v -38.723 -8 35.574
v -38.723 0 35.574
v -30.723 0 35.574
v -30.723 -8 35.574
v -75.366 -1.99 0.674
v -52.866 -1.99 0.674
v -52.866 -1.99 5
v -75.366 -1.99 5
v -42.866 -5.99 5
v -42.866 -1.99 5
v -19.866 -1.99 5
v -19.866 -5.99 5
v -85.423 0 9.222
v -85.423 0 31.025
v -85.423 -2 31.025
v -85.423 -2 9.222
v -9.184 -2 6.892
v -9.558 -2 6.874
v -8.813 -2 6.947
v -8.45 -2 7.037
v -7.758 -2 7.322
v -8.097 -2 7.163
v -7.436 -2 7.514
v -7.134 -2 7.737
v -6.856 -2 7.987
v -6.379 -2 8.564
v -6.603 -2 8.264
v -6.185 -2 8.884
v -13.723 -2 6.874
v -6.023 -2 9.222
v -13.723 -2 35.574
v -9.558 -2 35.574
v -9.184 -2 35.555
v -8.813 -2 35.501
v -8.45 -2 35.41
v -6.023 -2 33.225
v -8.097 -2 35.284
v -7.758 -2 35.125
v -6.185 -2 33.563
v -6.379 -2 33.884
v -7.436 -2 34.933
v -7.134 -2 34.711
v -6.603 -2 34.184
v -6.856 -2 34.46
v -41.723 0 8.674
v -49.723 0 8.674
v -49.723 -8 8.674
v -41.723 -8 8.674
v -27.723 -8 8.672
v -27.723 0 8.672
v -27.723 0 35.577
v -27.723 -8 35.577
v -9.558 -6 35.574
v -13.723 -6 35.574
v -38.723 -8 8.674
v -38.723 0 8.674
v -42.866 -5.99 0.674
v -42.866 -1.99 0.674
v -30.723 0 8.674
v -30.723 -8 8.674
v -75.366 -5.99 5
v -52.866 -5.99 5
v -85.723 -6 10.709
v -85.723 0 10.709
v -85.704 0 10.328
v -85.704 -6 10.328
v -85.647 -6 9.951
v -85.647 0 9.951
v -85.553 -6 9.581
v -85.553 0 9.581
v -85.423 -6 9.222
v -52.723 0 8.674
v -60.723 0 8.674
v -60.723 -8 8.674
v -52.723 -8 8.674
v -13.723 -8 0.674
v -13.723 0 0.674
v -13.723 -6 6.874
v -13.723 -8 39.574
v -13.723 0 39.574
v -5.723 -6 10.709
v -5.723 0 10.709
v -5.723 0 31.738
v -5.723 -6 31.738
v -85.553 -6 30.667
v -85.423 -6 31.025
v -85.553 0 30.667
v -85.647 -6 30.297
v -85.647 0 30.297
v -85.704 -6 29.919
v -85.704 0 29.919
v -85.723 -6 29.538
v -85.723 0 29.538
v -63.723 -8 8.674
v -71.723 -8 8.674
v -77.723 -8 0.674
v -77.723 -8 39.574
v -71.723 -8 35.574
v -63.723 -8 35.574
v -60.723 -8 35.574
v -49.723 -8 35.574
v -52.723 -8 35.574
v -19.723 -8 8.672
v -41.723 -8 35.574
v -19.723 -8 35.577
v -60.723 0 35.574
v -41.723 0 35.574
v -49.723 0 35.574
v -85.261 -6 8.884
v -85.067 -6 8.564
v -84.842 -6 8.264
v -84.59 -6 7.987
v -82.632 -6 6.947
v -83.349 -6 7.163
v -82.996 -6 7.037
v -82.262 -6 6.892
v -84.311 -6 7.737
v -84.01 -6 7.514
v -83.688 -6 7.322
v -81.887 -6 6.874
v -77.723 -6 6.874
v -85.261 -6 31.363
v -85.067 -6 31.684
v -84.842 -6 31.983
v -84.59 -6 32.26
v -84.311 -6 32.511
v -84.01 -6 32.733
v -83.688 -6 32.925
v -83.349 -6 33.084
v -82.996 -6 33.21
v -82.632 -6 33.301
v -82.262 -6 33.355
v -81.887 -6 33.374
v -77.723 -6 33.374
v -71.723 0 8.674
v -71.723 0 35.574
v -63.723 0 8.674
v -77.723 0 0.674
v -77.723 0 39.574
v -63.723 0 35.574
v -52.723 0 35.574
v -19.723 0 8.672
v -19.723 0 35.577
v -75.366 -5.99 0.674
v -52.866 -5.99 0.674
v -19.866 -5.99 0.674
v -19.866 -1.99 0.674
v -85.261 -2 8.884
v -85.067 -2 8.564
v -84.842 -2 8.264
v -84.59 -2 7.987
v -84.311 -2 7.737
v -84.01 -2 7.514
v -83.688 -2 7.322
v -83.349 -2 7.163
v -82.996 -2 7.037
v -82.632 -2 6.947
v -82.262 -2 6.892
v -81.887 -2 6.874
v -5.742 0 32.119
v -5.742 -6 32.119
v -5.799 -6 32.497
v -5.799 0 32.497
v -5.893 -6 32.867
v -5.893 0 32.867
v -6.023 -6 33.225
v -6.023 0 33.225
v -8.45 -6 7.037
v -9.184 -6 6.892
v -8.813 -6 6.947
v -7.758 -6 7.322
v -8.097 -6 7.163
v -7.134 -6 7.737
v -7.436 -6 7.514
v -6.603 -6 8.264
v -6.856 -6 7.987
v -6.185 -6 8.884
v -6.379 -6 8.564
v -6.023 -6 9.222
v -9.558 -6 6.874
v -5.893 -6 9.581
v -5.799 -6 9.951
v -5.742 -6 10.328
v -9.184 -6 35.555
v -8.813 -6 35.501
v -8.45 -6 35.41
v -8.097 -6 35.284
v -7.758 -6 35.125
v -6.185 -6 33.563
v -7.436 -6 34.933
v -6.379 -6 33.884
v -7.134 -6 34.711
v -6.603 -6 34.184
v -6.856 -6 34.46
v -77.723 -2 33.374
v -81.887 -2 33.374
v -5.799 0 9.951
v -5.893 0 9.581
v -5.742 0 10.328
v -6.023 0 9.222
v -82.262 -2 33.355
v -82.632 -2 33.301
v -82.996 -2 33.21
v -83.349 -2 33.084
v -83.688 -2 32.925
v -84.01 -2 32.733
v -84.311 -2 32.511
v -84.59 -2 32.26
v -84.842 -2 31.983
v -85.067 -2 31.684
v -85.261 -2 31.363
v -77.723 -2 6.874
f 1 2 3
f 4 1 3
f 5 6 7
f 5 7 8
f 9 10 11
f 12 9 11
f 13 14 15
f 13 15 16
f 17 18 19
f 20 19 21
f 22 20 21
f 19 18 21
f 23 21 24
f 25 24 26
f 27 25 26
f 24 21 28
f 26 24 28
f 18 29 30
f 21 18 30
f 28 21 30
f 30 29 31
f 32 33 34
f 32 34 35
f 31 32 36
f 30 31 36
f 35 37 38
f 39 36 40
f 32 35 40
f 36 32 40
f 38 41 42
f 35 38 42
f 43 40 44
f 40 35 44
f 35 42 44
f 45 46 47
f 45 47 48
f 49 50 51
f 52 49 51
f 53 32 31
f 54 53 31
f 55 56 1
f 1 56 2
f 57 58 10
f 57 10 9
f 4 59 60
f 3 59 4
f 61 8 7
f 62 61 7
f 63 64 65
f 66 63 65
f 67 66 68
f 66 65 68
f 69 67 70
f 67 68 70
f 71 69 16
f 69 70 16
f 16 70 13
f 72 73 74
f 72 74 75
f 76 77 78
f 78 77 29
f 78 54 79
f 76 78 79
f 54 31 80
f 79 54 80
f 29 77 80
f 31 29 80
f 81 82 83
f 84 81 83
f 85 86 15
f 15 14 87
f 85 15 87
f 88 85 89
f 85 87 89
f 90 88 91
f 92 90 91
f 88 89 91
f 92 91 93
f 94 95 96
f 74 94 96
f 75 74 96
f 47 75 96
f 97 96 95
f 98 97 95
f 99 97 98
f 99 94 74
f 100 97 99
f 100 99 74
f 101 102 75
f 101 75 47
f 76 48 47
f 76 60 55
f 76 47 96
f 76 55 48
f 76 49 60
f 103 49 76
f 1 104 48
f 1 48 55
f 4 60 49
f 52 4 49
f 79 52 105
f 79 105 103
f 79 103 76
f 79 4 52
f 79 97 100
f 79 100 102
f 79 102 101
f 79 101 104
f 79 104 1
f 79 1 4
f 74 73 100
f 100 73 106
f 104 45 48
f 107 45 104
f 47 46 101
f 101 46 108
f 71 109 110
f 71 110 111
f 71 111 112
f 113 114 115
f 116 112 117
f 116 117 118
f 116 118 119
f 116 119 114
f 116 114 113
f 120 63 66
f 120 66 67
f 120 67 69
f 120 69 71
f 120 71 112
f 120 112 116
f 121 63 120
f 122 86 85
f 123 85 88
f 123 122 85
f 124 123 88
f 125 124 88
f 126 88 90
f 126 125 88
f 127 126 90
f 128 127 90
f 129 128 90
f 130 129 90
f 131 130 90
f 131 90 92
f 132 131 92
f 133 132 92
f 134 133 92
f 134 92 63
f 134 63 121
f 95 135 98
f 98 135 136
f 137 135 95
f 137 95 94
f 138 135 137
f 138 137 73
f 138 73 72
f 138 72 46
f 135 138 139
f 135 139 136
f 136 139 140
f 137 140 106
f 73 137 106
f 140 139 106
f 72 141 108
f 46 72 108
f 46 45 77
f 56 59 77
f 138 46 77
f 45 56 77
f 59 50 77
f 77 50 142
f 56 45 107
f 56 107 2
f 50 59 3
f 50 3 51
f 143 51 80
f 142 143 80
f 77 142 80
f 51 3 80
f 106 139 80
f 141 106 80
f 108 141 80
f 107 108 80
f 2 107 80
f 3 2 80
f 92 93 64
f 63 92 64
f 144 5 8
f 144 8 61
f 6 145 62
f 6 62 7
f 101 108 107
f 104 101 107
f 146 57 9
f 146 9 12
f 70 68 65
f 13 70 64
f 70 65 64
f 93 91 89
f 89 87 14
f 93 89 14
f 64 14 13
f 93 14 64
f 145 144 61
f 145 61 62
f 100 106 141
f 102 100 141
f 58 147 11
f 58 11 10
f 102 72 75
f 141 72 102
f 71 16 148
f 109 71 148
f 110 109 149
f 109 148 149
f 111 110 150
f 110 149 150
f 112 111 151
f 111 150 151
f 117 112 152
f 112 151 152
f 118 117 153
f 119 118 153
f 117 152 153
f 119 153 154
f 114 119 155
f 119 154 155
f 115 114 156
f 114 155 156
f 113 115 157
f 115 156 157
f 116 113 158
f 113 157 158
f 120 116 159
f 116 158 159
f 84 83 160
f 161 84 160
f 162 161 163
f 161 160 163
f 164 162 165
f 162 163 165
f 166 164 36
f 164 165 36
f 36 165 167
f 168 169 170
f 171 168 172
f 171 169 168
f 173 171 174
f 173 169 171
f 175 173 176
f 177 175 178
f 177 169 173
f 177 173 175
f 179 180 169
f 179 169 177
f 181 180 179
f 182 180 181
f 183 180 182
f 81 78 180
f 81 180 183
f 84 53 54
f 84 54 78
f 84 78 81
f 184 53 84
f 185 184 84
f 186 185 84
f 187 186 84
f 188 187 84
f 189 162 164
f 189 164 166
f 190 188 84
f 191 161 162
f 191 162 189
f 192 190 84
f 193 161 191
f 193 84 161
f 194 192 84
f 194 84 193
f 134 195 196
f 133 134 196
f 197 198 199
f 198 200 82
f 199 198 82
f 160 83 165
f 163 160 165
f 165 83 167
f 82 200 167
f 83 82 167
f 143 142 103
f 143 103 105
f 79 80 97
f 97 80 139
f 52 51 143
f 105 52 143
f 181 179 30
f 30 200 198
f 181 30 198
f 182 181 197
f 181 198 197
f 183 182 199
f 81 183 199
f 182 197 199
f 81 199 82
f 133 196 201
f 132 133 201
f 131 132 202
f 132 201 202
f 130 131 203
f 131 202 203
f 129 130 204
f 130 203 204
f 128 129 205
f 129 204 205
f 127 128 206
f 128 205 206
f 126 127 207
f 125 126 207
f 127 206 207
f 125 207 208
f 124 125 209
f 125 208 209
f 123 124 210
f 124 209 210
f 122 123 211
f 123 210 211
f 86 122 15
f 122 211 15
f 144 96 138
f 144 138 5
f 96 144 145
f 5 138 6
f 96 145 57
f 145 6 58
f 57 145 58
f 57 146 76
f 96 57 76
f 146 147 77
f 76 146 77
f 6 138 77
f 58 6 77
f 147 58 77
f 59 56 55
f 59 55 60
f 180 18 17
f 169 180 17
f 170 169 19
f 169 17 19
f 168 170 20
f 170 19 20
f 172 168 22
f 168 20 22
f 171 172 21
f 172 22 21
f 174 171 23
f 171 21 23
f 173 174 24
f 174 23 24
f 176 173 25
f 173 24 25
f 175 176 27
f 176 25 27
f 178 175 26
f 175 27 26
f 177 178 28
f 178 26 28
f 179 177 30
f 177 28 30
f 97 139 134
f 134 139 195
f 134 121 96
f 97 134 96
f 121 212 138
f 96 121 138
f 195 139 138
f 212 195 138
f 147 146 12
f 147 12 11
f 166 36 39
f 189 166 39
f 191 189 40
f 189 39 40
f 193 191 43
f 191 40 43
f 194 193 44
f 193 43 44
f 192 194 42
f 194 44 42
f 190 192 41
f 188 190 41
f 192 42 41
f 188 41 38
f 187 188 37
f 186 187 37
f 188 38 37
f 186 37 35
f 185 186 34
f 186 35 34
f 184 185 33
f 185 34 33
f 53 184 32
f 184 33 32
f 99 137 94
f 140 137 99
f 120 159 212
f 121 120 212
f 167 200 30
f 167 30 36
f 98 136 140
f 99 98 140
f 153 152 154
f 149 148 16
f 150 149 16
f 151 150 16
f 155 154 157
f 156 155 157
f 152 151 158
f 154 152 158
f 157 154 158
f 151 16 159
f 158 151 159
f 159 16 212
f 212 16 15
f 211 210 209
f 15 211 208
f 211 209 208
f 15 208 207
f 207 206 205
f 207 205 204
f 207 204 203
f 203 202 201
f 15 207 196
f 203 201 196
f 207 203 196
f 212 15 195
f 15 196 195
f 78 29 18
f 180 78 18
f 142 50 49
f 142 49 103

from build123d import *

# Parameters (mm, degrees)
F0_W     = 8
F0_H     = 26.900017
F0_H_2   = 26.905365
F1_DEPTH = 6
F2_DEPTH = 2
F3_DEPTH = 8
F4_W     = 23
F4_H     = 4
F4_W_2   = 22.5
F5_DEPTH = 5


with BuildPart() as f1:
    # F0 (on Front) → F1 (new body)
    with BuildSketch(Plane.XZ):
        with BuildLine():
            Line((-85.422808, 9.222019), (-85.422808, 31.025267))
            ThreePointArc((-85.422808, 31.025267), (-85.64706, 30.296735), (-85.722808, 29.538243))
            Line((-85.722808, 29.538243), (-85.722808, 10.709043))
            ThreePointArc((-85.722808, 10.709043), (-85.64706, 9.950551), (-85.422808, 9.222019))
        make_face()
        with BuildLine():
            ThreePointArc((-5.722808, 31.73826), (-5.798556, 32.496752), (-6.022808, 33.225284))
            Line((-6.022808, 33.225284), (-6.022808, 9.222019))
            ThreePointArc((-6.022808, 9.222019), (-5.798556, 9.950551), (-5.722808, 10.709043))
            Line((-5.722808, 10.709043), (-5.722808, 31.73826))
        make_face()
        with BuildLine():
            Line((-9.558208, 35.57366), (-13.722808, 35.57366))
            Line((-13.722808, 35.57366), (-13.722808, 8.673643))
            Line((-13.722808, 8.673643), (-13.722808, 6.873643))
            Line((-13.722808, 6.873643), (-9.558208, 6.873643))
            ThreePointArc((-9.558208, 6.873643), (-7.436068, 7.514232), (-6.022808, 9.222019))
            Line((-6.022808, 9.222019), (-6.022808, 33.225284))
            ThreePointArc((-6.022808, 33.225284), (-7.436068, 34.93307), (-9.558208, 35.57366))
        make_face()
        Polygon((-71.722808, 39.57366), (-77.722808, 39.57366), (-77.722808, 35.57366), (-77.722808, 33.373643), (-77.722808, 15.555412), (-77.722808, 8.673643), (-77.722808, 6.873643), (-77.722808, 0.673643), (-71.722808, 0.673643), (-13.722808, 0.673643), (-13.722808, 6.873643), (-13.722808, 8.673643), (-13.722808, 35.57366), (-13.722808, 39.57366), (-21.722808, 39.57366), align=None)
        with Locations((-67.722808, 22.123651)):
            Rectangle(F0_W, F0_H, mode=Mode.SUBTRACT)
        with Locations((-56.722808, 22.123651)):
            Rectangle(F0_W, F0_H, mode=Mode.SUBTRACT)
        with Locations((-45.722808, 22.123651)):
            Rectangle(F0_W, F0_H, mode=Mode.SUBTRACT)
        with Locations((-34.722808, 22.123651)):
            Rectangle(F0_W, F0_H, mode=Mode.SUBTRACT)
        with Locations((-23.722808, 22.124238)):
            Rectangle(F0_W, F0_H_2, mode=Mode.SUBTRACT)
        with BuildLine():
            Line((-77.722808, 15.555412), (-77.722808, 33.373643))
            Line((-77.722808, 33.373643), (-81.887408, 33.373643))
            ThreePointArc((-81.887408, 33.373643), (-84.009549, 32.733053), (-85.422808, 31.025267))
            Line((-85.422808, 31.025267), (-85.422808, 9.222019))
            ThreePointArc((-85.422808, 9.222019), (-84.009549, 7.514232), (-81.887408, 6.873643))
            Line((-81.887408, 6.873643), (-77.722808, 6.873643))
            Line((-77.722808, 6.873643), (-77.722808, 8.673643))
            Line((-77.722808, 8.673643), (-77.722808, 15.555412))
        make_face()
    extrude(amount=F1_DEPTH)

    # F0 (on Front) → F2 (cut)
    with BuildSketch(Plane.XZ):
        with BuildLine():
            Line((-77.722808, 15.555412), (-77.722808, 33.373643))
            Line((-77.722808, 33.373643), (-81.887408, 33.373643))
            ThreePointArc((-81.887408, 33.373643), (-84.009549, 32.733053), (-85.422808, 31.025267))
            Line((-85.422808, 31.025267), (-85.422808, 9.222019))
            ThreePointArc((-85.422808, 9.222019), (-84.009549, 7.514232), (-81.887408, 6.873643))
            Line((-81.887408, 6.873643), (-77.722808, 6.873643))
            Line((-77.722808, 6.873643), (-77.722808, 8.673643))
            Line((-77.722808, 8.673643), (-77.722808, 15.555412))
        make_face()
        with BuildLine():
            Line((-9.558208, 35.57366), (-13.722808, 35.57366))
            Line((-13.722808, 35.57366), (-13.722808, 8.673643))
            Line((-13.722808, 8.673643), (-13.722808, 6.873643))
            Line((-13.722808, 6.873643), (-9.558208, 6.873643))
            ThreePointArc((-9.558208, 6.873643), (-7.436068, 7.514232), (-6.022808, 9.222019))
            Line((-6.022808, 9.222019), (-6.022808, 33.225284))
            ThreePointArc((-6.022808, 33.225284), (-7.436068, 34.93307), (-9.558208, 35.57366))
        make_face()
    extrude(amount=F2_DEPTH, mode=Mode.SUBTRACT)

    # F0 (on Front) → F3 (join)
    with BuildSketch(Plane.XZ):
        Polygon((-71.722808, 39.57366), (-77.722808, 39.57366), (-77.722808, 35.57366), (-77.722808, 33.373643), (-77.722808, 15.555412), (-77.722808, 8.673643), (-77.722808, 6.873643), (-77.722808, 0.673643), (-71.722808, 0.673643), (-13.722808, 0.673643), (-13.722808, 6.873643), (-13.722808, 8.673643), (-13.722808, 35.57366), (-13.722808, 39.57366), (-21.722808, 39.57366), align=None)
        with Locations((-67.722808, 22.123651)):
            Rectangle(F0_W, F0_H, mode=Mode.SUBTRACT)
        with Locations((-56.722808, 22.123651)):
            Rectangle(F0_W, F0_H, mode=Mode.SUBTRACT)
        with Locations((-45.722808, 22.123651)):
            Rectangle(F0_W, F0_H, mode=Mode.SUBTRACT)
        with Locations((-34.722808, 22.123651)):
            Rectangle(F0_W, F0_H, mode=Mode.SUBTRACT)
        with Locations((-23.722808, 22.124238)):
            Rectangle(F0_W, F0_H_2, mode=Mode.SUBTRACT)
    extrude(amount=F3_DEPTH)

    # F4 (on Top) → F5 (cut)
    with BuildSketch(Plane.XY):
        Polygon((-75.366058, -1.990048), (-75.366058, -5.990048), (-52.866058, -5.990048), (-52.866058, -3.990048), (-52.866058, -1.990048), align=None)
        Polygon((-42.866058, -1.990048), (-42.866058, -5.990048), (-19.866058, -5.990048), (-19.866058, -3.990048), (-19.866058, -1.990048), align=None)
        with Locations((23.633942, -3.990048)):
            Rectangle(F4_W, F4_H)
        with Locations((56.383942, -3.990048)):
            Rectangle(F4_W_2, F4_H)
    extrude(amount=F5_DEPTH, mode=Mode.SUBTRACT)


solid = f1.part
